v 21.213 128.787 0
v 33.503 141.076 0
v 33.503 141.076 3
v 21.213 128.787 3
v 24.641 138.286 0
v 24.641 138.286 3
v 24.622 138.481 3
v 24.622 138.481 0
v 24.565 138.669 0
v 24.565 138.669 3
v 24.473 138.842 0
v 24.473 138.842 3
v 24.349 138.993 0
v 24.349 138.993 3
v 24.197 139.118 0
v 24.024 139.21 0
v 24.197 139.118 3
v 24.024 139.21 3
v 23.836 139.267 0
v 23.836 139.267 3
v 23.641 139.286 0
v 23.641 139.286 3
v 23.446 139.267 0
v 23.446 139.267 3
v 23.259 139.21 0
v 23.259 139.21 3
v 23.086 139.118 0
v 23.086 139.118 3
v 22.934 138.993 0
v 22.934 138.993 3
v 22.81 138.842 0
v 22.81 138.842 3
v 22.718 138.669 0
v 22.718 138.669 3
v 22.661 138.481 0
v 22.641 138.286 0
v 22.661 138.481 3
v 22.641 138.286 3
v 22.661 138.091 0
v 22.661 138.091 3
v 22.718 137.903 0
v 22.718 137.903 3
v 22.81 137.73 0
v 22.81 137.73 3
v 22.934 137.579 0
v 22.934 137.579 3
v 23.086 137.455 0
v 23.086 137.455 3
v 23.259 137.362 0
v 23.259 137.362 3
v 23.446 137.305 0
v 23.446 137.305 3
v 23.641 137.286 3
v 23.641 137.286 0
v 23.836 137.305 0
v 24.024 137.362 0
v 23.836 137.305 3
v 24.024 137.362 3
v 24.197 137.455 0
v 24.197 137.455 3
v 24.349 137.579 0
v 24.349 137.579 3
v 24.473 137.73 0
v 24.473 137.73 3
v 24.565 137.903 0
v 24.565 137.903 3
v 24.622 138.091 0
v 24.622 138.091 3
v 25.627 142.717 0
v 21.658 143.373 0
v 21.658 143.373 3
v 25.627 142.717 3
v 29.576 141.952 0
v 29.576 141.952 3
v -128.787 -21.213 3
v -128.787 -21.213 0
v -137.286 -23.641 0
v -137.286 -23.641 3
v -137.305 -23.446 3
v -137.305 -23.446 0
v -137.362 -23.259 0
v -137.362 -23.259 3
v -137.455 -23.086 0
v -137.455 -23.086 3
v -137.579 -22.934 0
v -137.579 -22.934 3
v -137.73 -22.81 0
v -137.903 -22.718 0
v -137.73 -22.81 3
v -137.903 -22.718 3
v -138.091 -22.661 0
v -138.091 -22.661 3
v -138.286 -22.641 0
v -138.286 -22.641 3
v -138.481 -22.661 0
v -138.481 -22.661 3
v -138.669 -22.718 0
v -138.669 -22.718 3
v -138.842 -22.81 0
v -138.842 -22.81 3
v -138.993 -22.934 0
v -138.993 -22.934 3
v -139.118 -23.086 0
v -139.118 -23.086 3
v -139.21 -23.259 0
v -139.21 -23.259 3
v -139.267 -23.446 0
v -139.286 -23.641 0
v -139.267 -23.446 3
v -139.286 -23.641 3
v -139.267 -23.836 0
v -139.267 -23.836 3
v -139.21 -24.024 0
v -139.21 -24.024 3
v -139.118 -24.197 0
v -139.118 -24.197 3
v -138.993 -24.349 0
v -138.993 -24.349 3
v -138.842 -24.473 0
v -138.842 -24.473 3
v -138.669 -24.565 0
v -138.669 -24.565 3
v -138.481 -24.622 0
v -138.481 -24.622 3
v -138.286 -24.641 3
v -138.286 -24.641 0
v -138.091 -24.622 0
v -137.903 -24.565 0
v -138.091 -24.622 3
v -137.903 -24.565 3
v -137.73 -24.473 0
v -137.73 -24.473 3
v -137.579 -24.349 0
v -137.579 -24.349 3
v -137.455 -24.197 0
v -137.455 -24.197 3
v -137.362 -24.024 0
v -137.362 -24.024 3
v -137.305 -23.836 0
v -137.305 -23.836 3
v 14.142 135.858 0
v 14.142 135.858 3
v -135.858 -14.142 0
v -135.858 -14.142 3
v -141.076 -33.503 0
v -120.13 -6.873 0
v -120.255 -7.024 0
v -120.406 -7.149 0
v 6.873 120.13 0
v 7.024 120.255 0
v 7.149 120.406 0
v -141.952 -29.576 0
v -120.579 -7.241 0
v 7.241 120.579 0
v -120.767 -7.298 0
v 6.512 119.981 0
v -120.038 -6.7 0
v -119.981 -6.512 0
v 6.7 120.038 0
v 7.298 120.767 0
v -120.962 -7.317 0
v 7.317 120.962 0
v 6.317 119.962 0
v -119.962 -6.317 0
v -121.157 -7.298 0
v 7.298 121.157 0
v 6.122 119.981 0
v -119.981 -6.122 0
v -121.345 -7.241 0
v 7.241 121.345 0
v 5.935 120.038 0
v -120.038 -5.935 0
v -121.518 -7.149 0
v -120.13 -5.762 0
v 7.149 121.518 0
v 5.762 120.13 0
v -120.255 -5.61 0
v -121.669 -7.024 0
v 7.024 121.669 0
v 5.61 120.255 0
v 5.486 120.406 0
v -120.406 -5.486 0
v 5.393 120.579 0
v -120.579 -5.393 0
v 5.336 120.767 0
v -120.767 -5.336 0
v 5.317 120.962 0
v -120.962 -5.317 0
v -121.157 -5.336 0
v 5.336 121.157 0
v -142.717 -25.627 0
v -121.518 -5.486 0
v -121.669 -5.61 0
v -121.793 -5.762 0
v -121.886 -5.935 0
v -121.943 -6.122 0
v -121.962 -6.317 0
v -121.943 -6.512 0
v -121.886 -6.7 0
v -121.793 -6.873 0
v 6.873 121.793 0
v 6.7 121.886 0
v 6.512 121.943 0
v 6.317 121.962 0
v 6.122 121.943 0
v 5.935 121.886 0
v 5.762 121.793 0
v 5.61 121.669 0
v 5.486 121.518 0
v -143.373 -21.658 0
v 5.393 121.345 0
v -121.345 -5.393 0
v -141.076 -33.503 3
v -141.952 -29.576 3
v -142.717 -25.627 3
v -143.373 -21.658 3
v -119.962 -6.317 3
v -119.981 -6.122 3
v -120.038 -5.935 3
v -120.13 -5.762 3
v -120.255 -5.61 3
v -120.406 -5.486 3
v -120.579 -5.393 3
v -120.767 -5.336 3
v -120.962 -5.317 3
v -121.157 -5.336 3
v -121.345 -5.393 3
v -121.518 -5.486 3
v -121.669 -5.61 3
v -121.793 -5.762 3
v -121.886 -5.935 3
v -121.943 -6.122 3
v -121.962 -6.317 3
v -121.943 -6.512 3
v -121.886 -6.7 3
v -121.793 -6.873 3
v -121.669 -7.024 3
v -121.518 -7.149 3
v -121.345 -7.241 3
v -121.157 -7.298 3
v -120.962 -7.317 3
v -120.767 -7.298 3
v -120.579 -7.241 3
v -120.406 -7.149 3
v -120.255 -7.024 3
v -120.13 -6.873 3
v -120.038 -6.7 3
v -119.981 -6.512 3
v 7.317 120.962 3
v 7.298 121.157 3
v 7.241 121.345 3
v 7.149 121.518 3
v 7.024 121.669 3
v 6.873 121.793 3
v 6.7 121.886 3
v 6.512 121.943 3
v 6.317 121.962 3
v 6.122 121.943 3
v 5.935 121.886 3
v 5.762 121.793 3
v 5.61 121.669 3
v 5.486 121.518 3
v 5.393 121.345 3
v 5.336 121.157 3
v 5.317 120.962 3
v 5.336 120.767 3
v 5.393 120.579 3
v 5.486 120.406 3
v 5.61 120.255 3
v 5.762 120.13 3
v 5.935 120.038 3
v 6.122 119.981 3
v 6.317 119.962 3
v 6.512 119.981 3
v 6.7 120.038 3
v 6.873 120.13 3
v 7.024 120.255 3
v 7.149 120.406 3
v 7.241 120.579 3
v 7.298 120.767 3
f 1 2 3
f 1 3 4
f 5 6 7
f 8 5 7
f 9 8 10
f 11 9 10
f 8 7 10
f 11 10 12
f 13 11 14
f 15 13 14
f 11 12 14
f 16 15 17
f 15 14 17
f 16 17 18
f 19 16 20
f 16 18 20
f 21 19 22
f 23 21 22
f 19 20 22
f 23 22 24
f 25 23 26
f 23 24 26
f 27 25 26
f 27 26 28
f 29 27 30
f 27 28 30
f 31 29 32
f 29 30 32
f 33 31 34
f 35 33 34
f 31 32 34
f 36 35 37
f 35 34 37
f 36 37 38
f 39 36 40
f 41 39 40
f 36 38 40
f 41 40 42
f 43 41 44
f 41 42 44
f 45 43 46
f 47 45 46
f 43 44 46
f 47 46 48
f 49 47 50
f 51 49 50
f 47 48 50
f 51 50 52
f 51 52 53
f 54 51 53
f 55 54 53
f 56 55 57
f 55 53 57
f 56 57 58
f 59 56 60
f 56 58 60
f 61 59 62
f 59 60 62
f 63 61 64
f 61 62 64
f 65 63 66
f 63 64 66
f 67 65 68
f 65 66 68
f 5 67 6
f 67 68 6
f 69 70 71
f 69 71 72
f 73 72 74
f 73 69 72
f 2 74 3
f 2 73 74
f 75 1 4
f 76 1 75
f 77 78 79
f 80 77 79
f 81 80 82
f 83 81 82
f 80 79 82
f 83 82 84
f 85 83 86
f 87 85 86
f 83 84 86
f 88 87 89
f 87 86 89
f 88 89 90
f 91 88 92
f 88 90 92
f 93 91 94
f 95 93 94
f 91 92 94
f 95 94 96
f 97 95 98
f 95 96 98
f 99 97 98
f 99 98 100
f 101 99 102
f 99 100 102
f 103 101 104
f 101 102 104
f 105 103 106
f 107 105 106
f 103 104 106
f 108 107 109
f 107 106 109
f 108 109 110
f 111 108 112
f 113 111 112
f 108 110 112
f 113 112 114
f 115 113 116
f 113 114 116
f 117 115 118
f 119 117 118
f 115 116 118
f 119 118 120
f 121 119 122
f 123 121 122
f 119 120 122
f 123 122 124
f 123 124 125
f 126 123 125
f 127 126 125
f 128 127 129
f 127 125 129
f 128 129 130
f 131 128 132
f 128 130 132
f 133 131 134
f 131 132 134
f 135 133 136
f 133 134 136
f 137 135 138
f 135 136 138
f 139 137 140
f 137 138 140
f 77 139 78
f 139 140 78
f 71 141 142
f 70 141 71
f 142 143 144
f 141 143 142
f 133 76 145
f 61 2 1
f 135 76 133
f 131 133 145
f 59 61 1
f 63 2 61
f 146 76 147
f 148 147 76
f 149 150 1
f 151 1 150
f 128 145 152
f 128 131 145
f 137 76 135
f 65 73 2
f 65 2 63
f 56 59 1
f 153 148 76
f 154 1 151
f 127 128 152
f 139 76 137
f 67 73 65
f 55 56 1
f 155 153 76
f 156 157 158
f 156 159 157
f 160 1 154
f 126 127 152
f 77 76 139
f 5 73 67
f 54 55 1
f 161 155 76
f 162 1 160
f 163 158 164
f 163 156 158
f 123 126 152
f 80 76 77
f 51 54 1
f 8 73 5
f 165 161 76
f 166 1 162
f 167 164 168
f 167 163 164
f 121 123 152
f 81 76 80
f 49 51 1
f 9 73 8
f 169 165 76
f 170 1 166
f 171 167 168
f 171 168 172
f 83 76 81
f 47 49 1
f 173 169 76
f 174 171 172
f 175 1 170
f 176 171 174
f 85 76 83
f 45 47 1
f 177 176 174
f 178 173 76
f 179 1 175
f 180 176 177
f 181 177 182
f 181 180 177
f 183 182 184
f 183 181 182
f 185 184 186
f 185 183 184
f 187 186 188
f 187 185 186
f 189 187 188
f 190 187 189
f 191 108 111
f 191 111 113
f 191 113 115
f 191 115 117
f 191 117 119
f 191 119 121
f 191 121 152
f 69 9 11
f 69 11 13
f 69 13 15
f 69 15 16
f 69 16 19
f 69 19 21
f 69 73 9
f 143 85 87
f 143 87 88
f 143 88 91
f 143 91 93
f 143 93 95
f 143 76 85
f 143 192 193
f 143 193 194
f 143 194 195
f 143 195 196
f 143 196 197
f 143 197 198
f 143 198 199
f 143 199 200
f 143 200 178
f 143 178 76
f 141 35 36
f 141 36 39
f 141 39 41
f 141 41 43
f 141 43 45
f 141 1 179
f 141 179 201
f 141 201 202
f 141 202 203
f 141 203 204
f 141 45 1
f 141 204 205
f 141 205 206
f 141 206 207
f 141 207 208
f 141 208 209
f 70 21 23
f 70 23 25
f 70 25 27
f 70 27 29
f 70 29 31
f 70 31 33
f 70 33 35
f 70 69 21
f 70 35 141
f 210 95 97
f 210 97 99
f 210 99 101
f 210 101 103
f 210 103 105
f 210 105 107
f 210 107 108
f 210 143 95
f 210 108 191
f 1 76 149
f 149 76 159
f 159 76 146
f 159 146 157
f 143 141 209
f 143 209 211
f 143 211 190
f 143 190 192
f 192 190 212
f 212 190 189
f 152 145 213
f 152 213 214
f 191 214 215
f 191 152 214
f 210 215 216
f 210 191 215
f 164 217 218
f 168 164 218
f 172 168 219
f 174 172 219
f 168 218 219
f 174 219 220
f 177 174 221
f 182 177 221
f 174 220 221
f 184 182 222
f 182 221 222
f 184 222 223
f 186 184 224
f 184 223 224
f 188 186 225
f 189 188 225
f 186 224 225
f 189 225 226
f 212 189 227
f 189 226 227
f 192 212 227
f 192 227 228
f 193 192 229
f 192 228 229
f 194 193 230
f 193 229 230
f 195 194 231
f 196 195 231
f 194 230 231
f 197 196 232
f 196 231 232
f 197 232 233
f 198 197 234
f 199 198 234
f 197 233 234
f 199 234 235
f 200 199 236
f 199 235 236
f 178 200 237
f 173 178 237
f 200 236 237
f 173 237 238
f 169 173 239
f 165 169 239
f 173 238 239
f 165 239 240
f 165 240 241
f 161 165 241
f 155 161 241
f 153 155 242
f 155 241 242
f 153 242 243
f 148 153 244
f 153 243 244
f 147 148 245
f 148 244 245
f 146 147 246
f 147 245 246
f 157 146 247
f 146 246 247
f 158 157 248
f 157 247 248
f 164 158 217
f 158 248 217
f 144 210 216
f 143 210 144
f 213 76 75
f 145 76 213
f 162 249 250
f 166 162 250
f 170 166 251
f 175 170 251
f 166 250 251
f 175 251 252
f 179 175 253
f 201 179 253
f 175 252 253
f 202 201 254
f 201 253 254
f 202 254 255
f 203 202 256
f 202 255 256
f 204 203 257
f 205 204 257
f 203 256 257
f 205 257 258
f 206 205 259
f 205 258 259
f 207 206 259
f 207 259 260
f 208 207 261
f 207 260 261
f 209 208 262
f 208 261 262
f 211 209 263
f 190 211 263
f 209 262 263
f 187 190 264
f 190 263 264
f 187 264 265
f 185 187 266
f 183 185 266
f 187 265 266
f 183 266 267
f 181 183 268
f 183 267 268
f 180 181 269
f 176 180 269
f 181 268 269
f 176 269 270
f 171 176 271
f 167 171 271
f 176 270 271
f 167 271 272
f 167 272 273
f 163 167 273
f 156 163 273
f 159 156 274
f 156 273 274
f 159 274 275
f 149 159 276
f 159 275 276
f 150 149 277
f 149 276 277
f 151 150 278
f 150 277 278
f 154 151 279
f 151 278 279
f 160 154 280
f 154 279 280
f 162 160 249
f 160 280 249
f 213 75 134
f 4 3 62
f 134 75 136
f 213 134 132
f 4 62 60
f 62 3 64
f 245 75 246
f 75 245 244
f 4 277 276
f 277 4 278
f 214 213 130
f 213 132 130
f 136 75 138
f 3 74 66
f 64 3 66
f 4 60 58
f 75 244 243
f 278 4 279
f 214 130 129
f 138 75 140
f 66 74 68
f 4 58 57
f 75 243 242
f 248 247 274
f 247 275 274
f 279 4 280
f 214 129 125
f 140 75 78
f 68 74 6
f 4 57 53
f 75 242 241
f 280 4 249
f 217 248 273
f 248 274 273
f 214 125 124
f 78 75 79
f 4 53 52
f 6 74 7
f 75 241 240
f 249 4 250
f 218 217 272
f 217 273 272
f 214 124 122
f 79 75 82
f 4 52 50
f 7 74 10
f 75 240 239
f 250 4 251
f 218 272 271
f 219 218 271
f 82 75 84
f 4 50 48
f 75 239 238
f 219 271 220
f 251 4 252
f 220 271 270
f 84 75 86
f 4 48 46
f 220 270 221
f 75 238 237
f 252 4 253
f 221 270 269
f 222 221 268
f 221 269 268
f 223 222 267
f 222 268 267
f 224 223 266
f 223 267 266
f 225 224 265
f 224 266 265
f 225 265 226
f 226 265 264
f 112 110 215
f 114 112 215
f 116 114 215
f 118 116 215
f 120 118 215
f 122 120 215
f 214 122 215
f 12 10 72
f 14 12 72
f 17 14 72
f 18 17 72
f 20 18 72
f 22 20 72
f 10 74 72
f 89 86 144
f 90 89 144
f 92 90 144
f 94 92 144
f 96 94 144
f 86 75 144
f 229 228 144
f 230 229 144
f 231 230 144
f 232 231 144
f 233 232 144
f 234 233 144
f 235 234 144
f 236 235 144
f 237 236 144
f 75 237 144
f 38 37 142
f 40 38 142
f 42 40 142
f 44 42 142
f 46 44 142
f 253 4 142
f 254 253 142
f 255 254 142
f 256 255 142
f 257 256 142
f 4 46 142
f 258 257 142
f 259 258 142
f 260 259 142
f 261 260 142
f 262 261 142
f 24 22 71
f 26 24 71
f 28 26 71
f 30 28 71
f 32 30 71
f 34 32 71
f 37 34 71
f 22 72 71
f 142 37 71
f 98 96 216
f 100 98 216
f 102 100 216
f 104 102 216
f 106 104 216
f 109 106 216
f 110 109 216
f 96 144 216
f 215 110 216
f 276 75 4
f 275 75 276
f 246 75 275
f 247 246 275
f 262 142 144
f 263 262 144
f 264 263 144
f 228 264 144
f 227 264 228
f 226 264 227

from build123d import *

# Parameters (mm, degrees)
BOSS_EXTRU_1_DEPTH      = 3
ESQUISSE2_R             = 1
ENL_V_MAT_EXTRU_1_DEPTH = 3


with BuildPart() as part:
    # Esquisse1 → Boss.-Extru.1 (new body)
    with BuildSketch(Plane.XY):
        with BuildLine():
            Line((33.50283922, 141.076432349), (21.213203436, 128.786796564))
            Line((21.213203436, 128.786796564), (-128.786796564, -21.213203436))
            Line((-128.786796564, -21.213203436), (-141.076432349, -33.50283922))
            ThreePointArc((-141.076432349, -33.50283922), (-142.348197514, -27.604178387), (-143.373440746, -21.657711993))
            Line((-143.373440746, -21.657711993), (-135.857864376, -14.142135624))
            Line((-135.857864376, -14.142135624), (14.142135624, 135.857864376))
            Line((14.142135624, 135.857864376), (21.657711993, 143.373440746))
            ThreePointArc((21.657711993, 143.373440746), (27.604178387, 142.348197514), (33.50283922, 141.076432349))
        make_face()
    extrude(amount=BOSS_EXTRU_1_DEPTH)

    # Esquisse2 → Enlèv. mat.-Extru.1 (cut)
    with BuildSketch(Plane.XY.offset(3)):
        with Locations((6.317279836, 120.961940777)):
            Circle(ESQUISSE2_R)
        with Locations((-120.961940777, -6.317279836)):
            Circle(ESQUISSE2_R)
        with Locations((23.641395976, 138.286056916)):
            Circle(ESQUISSE2_R)
        with Locations((-138.286056916, -23.641395976)):
            Circle(ESQUISSE2_R)
    extrude(amount=-ENL_V_MAT_EXTRU_1_DEPTH, mode=Mode.SUBTRACT)


solid = part.part
